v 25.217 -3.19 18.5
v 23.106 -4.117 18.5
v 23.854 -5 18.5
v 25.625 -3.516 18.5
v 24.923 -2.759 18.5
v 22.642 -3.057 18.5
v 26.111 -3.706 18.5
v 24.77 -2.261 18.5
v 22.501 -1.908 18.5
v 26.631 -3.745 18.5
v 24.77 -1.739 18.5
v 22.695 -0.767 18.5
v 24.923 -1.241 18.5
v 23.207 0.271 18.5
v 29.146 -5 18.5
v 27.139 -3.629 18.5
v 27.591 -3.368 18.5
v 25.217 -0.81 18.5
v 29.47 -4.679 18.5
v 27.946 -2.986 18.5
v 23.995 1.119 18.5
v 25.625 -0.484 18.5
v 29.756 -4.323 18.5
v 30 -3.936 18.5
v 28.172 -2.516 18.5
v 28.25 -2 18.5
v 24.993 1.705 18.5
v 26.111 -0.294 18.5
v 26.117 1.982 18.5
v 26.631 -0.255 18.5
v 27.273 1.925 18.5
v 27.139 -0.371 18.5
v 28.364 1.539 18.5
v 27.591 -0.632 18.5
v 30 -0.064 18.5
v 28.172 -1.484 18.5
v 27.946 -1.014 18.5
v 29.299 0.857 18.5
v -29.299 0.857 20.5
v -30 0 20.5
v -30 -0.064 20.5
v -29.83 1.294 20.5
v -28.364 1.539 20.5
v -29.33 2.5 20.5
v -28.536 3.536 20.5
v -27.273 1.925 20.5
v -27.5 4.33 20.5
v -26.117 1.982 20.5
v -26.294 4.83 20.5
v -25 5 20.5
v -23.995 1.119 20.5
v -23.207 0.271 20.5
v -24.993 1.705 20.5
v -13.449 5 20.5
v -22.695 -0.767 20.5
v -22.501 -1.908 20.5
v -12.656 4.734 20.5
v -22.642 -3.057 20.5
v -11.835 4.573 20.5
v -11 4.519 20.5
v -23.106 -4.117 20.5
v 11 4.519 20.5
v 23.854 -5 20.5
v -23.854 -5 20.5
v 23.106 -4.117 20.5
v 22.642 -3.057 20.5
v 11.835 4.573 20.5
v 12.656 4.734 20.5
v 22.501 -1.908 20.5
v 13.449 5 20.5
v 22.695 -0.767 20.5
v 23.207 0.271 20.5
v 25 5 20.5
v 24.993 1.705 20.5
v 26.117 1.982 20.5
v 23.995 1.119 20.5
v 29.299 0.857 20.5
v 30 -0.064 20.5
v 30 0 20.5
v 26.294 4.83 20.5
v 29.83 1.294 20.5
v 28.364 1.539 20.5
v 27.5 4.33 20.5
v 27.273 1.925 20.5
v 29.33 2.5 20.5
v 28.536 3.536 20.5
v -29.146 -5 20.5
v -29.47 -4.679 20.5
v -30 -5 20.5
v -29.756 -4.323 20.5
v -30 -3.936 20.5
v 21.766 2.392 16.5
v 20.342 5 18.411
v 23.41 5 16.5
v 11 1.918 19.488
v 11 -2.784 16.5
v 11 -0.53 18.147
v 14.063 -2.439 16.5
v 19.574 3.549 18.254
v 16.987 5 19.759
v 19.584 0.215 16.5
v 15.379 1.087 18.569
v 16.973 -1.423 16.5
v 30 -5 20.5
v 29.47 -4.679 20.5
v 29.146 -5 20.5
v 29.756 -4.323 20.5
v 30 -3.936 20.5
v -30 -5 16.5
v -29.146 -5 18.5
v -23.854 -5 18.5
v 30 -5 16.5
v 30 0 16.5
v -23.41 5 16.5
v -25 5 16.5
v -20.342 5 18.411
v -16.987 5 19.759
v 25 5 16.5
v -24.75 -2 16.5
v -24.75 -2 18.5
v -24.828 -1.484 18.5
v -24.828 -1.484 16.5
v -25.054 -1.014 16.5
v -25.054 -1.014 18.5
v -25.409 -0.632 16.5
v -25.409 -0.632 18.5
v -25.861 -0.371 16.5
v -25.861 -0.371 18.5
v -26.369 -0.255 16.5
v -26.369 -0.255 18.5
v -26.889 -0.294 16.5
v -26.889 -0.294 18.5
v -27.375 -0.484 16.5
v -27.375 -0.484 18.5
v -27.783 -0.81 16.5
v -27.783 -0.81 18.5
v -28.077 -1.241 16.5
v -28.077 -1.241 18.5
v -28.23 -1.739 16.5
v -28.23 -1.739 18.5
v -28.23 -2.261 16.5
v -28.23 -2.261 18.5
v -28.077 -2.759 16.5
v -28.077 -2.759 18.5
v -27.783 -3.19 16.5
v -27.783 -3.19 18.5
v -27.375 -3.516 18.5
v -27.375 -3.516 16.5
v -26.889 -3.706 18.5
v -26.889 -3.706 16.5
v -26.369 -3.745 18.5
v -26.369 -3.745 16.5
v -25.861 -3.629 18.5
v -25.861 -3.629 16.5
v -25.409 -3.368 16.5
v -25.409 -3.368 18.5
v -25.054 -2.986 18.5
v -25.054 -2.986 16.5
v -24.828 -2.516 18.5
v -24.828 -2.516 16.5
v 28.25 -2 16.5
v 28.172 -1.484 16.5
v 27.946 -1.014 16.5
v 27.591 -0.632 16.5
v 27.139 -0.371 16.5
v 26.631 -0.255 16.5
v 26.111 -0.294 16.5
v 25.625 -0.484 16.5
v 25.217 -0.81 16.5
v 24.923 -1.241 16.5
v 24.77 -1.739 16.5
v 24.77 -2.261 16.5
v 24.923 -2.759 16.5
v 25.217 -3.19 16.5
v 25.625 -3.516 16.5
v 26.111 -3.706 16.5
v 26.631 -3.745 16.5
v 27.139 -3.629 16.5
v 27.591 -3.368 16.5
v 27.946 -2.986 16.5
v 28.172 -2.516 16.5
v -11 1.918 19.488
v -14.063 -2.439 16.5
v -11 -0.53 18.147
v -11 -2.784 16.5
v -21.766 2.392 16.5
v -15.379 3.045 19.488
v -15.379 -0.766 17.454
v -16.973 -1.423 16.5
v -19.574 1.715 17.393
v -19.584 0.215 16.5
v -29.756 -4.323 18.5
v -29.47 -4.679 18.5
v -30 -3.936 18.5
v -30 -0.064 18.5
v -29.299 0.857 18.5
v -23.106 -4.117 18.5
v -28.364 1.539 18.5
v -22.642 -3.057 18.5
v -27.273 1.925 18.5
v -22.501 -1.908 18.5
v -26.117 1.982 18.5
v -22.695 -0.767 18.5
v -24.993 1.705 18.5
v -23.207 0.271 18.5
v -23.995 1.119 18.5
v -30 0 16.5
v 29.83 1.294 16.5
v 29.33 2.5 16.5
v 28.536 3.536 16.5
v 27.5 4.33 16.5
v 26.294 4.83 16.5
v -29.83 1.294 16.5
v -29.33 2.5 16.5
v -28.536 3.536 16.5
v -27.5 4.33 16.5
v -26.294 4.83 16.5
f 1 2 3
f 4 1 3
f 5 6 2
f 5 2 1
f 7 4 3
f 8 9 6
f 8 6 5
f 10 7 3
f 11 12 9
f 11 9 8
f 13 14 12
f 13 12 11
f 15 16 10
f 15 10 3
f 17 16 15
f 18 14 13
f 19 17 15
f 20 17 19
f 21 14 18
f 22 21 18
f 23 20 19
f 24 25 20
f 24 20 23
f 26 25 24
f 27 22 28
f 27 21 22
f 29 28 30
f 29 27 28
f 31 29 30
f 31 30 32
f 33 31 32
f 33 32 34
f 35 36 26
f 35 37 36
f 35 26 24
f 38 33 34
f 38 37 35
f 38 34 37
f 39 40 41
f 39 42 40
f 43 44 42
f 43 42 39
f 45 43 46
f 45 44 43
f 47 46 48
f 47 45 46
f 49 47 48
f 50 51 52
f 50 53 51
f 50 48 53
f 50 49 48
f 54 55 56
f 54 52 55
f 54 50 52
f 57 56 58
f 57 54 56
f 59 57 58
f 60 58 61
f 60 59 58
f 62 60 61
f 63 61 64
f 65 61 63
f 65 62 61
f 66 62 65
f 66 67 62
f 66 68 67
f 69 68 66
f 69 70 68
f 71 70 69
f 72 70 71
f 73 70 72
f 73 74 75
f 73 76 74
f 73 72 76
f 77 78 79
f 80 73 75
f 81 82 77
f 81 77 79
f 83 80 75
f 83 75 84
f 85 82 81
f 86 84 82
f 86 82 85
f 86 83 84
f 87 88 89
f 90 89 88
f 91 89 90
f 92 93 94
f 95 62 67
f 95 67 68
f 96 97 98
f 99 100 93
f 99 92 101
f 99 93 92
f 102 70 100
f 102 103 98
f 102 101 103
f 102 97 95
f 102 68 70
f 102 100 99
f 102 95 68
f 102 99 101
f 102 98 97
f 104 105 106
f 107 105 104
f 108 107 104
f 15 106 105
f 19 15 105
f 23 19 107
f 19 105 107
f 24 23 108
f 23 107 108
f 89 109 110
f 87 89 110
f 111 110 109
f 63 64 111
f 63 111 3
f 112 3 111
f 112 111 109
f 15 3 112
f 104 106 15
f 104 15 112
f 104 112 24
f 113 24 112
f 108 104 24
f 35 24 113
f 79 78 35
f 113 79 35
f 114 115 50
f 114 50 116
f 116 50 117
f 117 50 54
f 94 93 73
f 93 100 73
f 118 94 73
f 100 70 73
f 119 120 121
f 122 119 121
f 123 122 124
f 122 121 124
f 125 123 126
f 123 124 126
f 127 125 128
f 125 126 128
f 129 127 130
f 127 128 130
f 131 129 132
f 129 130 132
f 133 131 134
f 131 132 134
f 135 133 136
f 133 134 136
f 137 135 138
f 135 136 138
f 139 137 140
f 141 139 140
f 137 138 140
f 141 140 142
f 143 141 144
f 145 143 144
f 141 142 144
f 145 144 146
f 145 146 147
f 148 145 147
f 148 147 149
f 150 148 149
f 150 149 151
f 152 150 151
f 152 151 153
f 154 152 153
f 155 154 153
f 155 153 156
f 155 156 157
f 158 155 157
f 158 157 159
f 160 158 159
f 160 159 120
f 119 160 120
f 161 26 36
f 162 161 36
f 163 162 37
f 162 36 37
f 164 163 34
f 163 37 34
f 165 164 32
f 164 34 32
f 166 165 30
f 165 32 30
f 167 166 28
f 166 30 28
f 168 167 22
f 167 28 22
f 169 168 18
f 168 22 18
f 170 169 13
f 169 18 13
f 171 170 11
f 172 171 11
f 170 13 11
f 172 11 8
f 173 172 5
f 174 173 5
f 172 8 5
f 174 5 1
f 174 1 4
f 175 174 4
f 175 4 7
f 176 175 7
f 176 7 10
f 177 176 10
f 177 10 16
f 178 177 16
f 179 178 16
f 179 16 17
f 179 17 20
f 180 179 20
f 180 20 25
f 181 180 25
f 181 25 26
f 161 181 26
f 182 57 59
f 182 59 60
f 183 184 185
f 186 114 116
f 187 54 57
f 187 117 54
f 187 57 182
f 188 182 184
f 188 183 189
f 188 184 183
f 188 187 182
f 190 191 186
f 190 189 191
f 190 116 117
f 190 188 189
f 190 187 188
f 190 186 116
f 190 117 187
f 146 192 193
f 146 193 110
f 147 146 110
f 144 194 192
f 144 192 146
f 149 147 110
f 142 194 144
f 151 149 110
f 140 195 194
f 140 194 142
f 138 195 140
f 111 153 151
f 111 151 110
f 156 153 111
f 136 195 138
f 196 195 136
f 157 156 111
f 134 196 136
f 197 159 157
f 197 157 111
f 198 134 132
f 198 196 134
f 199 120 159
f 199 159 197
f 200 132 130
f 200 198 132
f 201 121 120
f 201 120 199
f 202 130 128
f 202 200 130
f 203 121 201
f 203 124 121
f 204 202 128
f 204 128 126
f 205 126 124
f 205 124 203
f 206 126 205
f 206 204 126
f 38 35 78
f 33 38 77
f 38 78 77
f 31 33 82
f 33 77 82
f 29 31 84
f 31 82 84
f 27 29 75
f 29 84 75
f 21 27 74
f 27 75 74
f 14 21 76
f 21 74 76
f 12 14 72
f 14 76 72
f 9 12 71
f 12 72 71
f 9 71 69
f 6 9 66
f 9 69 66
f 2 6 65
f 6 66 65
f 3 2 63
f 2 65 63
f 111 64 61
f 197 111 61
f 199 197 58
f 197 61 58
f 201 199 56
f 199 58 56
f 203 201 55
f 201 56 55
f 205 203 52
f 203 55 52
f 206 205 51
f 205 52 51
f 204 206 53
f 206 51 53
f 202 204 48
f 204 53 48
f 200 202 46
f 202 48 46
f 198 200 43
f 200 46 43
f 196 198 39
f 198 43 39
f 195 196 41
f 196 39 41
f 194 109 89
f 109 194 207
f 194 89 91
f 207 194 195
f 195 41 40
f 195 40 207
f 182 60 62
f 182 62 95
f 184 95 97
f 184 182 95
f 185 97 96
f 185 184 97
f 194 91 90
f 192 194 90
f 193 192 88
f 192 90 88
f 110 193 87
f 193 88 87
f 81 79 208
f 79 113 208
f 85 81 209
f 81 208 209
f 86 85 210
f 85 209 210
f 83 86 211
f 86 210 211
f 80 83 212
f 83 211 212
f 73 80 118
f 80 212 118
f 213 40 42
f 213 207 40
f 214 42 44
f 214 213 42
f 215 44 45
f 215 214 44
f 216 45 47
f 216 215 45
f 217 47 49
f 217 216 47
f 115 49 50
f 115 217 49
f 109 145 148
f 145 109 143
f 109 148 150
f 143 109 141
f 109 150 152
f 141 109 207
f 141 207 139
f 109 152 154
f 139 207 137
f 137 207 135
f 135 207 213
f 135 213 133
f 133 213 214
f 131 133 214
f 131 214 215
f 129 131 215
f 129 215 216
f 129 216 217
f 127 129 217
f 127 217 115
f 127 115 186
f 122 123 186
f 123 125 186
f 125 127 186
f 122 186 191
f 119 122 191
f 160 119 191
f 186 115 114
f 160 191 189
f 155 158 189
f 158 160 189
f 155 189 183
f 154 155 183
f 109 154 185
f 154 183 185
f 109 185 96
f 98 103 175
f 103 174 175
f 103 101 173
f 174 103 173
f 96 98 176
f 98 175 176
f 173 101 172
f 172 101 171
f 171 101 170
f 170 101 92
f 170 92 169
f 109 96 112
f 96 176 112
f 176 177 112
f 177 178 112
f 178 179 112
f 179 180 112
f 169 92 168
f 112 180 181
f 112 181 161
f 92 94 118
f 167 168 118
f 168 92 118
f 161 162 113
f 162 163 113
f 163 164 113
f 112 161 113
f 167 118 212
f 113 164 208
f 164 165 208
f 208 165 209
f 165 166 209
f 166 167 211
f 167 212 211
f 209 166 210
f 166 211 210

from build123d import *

# Parameters (mm, degrees)
SKETCH1_W           = 60
SKETCH1_H           = 10
BOSS_EXTRUDE1_DEPTH = 20.5
SKETCH3_W           = 60
SKETCH3_H           = 37
CUT_EXTRUDE1_DEPTH  = 38.686204372
FILLET1_R           = 5
SKETCH4_R           = 1.75
CUT_EXTRUDE2_DEPTH  = 31.6757233
SKETCH5_R           = 4
CUT_EXTRUDE5_DEPTH  = 2


with BuildPart() as part:
    # Sketch1 → Boss-Extrude1 (new, symmetric)
    with BuildSketch(Plane.XY):
        Rectangle(SKETCH1_W, SKETCH1_H)
    extrude(amount=BOSS_EXTRUDE1_DEPTH, both=True)

    # Sketch2 → Cut-Revolve1 (revolve, cut)
    with BuildSketch(Plane.XY):
        with BuildLine():
            Line((-32.5, 11), (32.5, 11))
            ThreePointArc((32.5, 11), (26.202795796, -4.202795796), (11, -10.5))
            Line((11, -10.5), (-11, -10.5))
            ThreePointArc((-11, -10.5), (-26.202795796, -4.202795796), (-32.5, 11))
        make_face()
    revolve(axis=Axis((-32.5, 11, 0), (1, 0, 0)), mode=Mode.SUBTRACT)

    # Sketch3 → Cut-Extrude1 (cut, through all)
    with BuildSketch(Plane(origin=(0, 5, 0), x_dir=(1, 0, 0), z_dir=(0, 1, 0))):
        with Locations((0, 2)):
            Rectangle(SKETCH3_W, SKETCH3_H)
    extrude(amount=-CUT_EXTRUDE1_DEPTH, mode=Mode.SUBTRACT)

    # Fillet1
    fillet1_edges = [part.edges().sort_by_distance(p)[0] for p in [
        (-30, 5, 18.5),
        (30, 5, 18.5),
    ]]
    fillet(fillet1_edges, radius=FILLET1_R)

    # Sketch4 → Cut-Extrude2 (cut, through all)
    with BuildSketch(Plane.XY.offset(20.5)):
        with Locations((-26.5, -2)):
            Circle(SKETCH4_R)
        with Locations((26.5, -2)):
            Circle(SKETCH4_R)
    extrude(amount=-CUT_EXTRUDE2_DEPTH, mode=Mode.SUBTRACT)

    # Sketch5 → Cut-Extrude5 (cut)
    with BuildSketch(Plane.XY.offset(20.5)):
        with Locations((-26.5, -2)):
            Circle(SKETCH5_R)
        with Locations((26.5, -2)):
            Circle(SKETCH5_R)
    extrude(amount=-CUT_EXTRUDE5_DEPTH, mode=Mode.SUBTRACT)


solid = part.part
